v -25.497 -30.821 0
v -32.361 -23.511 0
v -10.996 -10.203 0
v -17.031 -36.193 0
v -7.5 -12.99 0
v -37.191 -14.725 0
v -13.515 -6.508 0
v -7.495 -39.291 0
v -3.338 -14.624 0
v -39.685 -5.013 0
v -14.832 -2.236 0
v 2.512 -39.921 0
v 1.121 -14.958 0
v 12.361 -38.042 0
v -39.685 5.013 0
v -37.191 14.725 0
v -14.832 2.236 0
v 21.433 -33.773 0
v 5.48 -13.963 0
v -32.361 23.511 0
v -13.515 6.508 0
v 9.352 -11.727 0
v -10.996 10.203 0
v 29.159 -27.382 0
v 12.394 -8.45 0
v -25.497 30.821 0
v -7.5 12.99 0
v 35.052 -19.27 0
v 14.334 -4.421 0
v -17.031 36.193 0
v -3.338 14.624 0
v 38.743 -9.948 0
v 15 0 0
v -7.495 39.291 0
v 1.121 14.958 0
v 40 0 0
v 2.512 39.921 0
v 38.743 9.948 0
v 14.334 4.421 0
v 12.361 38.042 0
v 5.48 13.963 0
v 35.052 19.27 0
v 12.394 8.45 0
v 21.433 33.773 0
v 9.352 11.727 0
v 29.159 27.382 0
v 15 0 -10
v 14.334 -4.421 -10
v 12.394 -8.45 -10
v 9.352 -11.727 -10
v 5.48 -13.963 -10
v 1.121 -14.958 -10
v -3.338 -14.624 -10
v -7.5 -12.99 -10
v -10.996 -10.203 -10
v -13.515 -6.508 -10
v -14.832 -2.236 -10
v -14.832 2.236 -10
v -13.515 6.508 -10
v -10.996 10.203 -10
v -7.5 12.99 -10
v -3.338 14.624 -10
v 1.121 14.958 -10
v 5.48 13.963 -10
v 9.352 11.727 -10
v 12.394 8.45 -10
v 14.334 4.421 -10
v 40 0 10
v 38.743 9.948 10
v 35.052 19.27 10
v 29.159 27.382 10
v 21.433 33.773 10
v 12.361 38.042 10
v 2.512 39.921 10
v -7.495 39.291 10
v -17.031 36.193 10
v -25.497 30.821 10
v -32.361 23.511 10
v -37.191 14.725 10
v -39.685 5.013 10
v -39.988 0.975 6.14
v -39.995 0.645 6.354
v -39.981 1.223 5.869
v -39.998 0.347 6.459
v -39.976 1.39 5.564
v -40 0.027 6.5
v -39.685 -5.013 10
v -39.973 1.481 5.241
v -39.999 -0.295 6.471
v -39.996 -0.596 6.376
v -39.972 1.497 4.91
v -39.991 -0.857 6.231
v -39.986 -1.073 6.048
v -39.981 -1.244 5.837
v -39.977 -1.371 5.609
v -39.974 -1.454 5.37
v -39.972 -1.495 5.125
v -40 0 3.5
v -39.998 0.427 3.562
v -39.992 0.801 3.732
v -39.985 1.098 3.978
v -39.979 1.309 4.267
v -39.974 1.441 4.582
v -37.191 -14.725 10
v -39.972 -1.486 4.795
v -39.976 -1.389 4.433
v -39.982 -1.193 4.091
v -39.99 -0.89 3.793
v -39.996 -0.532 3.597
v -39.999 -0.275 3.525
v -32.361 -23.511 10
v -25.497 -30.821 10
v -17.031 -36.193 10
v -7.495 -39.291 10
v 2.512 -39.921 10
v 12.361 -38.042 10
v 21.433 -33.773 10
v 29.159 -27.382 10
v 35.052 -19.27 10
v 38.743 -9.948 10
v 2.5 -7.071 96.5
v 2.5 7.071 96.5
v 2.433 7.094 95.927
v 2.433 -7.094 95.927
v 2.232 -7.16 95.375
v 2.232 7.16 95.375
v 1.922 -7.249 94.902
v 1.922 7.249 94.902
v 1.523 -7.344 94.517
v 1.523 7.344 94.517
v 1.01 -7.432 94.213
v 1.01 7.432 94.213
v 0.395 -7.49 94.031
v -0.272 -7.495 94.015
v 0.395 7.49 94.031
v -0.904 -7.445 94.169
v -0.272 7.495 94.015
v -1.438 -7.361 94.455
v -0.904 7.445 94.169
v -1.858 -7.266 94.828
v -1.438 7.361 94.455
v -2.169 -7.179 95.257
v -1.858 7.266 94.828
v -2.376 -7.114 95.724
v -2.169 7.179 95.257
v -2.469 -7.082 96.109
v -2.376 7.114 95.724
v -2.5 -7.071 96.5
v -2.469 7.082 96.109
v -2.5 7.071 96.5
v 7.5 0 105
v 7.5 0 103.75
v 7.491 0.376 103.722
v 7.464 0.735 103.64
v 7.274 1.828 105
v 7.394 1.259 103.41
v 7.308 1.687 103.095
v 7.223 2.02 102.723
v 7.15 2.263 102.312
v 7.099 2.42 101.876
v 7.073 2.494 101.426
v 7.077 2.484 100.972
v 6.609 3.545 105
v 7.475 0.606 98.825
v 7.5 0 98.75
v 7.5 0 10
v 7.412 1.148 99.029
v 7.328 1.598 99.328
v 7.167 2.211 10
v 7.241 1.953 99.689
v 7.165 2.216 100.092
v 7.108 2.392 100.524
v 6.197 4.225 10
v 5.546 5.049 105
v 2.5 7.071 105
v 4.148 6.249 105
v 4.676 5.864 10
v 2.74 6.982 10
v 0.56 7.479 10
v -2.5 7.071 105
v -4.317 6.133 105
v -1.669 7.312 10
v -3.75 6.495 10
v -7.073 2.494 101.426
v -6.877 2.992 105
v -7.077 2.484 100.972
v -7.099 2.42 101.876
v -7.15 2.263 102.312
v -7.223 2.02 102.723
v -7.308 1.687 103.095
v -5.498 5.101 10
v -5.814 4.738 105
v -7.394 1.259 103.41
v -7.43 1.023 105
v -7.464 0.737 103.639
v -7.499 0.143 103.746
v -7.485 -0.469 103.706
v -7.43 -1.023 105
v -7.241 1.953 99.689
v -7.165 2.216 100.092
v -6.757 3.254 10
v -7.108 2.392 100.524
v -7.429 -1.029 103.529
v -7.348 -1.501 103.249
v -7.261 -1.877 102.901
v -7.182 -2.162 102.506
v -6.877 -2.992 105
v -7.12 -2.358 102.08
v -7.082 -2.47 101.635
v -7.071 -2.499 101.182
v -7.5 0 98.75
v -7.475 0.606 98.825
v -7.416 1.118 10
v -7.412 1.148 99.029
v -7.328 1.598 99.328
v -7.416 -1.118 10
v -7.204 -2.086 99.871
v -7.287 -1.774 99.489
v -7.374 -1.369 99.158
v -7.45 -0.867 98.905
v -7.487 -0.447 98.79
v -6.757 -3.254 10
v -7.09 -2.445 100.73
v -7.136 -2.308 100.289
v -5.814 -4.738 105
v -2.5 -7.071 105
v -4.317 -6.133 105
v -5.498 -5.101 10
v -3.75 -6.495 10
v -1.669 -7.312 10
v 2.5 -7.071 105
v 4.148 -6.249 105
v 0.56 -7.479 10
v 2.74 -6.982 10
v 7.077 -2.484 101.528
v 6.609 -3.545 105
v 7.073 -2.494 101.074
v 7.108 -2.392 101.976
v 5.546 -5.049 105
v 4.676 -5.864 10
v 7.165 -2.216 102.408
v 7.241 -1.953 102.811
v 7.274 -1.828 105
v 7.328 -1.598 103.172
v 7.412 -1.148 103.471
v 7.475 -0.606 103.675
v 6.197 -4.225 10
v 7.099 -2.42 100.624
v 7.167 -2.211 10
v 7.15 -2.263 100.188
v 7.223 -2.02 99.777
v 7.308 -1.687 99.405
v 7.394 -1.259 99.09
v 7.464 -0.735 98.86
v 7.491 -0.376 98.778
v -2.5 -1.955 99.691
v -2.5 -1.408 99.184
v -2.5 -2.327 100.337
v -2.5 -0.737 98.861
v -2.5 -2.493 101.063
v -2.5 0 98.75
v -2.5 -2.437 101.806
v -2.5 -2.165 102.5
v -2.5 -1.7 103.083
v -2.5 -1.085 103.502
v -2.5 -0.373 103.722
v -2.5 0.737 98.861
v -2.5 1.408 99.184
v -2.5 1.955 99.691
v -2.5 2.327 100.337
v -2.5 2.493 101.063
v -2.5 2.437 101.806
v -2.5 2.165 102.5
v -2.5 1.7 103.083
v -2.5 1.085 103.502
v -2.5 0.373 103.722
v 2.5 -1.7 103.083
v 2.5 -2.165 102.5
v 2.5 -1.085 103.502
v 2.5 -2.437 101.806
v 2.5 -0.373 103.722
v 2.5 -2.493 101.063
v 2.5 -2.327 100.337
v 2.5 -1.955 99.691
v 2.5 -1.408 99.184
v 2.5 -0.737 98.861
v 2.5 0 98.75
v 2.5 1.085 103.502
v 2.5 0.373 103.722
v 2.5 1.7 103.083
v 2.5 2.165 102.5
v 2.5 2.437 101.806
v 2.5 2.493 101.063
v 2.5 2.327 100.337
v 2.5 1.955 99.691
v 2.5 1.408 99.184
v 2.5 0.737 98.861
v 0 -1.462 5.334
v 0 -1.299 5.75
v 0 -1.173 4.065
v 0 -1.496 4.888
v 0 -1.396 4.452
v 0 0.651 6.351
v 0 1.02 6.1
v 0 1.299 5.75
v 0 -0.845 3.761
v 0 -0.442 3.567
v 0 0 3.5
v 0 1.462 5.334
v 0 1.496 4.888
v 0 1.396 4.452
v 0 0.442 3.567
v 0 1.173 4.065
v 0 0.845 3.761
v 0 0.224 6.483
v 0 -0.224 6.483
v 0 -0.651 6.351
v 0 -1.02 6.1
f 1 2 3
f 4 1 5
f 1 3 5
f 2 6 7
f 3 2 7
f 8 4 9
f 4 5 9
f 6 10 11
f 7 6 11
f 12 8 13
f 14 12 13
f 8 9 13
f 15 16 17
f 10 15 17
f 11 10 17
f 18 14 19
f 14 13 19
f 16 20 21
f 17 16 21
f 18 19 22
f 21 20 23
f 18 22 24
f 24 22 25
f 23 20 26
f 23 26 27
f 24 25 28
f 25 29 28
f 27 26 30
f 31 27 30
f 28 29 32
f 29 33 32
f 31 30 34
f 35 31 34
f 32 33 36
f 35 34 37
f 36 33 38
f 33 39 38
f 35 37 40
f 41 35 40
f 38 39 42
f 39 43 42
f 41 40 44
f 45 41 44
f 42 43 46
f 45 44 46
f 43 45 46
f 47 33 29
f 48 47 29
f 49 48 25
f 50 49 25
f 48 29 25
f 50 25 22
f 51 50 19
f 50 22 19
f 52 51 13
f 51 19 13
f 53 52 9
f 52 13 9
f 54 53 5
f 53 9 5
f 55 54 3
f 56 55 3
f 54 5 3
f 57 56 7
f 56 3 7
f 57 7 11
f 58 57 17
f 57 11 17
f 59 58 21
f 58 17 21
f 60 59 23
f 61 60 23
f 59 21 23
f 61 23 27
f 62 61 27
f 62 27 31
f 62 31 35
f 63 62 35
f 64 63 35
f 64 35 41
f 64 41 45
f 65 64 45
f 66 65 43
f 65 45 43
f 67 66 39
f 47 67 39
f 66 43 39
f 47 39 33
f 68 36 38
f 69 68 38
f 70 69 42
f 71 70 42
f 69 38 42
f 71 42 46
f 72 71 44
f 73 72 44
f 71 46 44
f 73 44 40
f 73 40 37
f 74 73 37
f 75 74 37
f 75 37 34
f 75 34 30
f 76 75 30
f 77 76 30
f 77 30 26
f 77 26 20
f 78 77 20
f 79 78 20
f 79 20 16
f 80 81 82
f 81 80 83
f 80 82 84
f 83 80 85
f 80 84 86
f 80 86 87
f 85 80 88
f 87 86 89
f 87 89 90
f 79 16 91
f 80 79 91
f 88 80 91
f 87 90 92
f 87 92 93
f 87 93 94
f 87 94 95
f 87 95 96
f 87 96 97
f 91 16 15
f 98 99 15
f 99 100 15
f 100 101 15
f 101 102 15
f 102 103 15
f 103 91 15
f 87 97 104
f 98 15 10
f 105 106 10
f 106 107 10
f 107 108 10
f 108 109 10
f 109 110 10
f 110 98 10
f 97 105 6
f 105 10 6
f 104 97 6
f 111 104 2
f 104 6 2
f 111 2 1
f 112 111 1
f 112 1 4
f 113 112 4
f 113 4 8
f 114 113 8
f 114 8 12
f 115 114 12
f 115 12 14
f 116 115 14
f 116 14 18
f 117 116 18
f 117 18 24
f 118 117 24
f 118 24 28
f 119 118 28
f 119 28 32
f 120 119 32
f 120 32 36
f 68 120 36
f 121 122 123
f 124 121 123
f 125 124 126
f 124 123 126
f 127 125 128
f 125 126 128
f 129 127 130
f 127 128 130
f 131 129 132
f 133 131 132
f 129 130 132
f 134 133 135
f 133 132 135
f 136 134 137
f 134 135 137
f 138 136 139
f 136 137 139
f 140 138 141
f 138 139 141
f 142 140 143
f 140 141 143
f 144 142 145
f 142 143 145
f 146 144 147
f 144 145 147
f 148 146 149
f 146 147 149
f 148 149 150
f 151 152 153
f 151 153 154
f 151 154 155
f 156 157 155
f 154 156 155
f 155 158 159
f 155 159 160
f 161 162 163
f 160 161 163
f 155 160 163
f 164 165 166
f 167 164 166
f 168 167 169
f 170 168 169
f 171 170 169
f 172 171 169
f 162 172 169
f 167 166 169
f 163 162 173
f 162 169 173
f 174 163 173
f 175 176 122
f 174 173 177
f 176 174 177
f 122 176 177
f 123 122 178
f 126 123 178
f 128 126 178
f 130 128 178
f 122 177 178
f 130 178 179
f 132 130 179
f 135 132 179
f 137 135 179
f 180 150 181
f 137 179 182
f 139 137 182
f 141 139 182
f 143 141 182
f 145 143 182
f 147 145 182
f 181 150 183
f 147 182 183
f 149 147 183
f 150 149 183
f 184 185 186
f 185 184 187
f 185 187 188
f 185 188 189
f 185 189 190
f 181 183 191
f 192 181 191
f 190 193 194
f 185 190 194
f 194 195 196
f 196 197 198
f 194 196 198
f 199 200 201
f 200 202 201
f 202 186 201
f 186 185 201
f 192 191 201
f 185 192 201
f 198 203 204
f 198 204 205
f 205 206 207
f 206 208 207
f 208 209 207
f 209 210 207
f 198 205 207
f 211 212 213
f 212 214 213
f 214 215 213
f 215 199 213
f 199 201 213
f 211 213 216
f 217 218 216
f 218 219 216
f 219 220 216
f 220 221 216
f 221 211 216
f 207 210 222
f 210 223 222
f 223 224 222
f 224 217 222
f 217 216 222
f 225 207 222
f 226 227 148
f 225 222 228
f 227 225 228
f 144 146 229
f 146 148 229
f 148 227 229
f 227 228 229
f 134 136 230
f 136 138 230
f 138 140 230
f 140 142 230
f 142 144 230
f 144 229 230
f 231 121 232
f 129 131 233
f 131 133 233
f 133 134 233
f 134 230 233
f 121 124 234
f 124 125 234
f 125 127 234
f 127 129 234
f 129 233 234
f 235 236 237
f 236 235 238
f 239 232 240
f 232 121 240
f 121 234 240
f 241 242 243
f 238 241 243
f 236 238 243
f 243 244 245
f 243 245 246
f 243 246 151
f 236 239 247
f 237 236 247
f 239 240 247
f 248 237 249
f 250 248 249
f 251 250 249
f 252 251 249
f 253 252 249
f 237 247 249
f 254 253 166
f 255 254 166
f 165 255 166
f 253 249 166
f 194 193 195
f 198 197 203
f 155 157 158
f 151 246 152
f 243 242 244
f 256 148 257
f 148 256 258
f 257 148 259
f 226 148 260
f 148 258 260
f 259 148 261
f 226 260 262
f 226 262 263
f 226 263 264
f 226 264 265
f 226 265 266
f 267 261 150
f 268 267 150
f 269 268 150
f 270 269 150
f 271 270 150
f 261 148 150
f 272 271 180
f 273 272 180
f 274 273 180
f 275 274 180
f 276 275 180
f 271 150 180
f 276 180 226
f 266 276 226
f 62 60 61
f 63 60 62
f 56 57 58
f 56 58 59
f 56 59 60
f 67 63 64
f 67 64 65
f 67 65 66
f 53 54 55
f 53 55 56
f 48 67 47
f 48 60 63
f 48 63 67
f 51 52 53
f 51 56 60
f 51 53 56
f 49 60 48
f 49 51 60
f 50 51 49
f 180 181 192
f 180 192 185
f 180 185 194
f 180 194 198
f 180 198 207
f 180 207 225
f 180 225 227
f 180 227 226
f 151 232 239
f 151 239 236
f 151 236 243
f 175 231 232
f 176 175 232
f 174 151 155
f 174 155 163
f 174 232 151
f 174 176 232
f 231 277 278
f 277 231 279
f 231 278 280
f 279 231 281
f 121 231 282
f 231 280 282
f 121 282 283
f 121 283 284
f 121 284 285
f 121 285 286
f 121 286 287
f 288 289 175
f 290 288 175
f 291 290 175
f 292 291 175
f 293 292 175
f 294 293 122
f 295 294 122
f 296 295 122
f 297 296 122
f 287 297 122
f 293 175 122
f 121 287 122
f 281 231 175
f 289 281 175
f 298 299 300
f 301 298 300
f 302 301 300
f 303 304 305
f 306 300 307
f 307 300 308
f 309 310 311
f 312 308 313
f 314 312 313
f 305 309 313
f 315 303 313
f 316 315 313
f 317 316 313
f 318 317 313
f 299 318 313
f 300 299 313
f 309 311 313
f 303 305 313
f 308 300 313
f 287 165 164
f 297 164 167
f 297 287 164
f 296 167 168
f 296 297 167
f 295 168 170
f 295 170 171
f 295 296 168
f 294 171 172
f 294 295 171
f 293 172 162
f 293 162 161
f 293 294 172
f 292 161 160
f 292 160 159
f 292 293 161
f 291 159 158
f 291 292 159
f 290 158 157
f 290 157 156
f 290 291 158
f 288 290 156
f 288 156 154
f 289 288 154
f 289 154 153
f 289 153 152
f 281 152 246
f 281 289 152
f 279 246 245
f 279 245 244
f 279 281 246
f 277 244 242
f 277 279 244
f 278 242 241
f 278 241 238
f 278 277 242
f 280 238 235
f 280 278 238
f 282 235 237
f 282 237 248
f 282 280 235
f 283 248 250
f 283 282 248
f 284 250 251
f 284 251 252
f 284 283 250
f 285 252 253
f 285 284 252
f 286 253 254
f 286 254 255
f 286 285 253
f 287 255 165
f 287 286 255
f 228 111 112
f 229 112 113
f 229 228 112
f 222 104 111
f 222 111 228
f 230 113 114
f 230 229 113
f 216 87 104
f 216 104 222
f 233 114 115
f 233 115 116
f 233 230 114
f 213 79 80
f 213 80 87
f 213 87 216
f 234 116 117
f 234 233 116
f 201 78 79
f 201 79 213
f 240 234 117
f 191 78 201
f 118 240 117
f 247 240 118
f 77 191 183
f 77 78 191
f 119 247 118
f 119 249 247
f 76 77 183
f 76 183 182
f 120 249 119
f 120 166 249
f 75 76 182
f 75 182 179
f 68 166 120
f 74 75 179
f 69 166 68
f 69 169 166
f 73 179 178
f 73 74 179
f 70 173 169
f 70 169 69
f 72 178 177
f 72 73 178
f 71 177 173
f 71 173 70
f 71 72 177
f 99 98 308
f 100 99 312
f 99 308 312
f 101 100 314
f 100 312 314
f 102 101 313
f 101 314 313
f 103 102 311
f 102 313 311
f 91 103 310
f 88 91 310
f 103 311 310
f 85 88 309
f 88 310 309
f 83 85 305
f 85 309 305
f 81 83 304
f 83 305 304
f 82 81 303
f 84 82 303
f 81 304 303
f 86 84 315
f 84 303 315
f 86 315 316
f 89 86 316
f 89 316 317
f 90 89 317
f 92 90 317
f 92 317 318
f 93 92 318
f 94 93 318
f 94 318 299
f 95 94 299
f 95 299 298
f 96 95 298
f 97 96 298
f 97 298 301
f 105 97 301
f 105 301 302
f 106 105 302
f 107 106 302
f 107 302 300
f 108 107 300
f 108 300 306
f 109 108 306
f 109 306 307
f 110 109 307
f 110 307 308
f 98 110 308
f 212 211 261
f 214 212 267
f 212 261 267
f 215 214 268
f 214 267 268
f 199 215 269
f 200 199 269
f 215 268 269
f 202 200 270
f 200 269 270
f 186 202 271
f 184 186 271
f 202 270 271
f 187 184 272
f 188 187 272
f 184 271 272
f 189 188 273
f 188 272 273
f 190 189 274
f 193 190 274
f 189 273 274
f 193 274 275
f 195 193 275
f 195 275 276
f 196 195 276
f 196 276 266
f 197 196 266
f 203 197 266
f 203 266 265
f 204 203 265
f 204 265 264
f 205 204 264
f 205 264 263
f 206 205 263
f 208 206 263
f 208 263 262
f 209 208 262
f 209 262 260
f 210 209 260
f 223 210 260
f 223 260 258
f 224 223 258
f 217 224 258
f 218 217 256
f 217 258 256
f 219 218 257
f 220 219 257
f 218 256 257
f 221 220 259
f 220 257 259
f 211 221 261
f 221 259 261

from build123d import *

# Parameters (mm, degrees)
SKETCH1_R           = 40
BOSS_EXTRUDE1_DEPTH = 10
SKETCH12_R          = 15
BOSS_EXTRUDE3_DEPTH = 10
SKETCH13_R          = 7.5
BOSS_EXTRUDE4_DEPTH = 95
CUT_EXTRUDE1_DEPTH  = 120.268604419
SKETCH17_R          = 2.5
CUT_EXTRUDE3_DEPTH  = 120.268604507
SKETCH18_R          = 1.5
CUT_EXTRUDE4_DEPTH  = 120.268604507


with BuildPart() as part:
    # Sketch1 → Boss-Extrude1 (new body)
    with BuildSketch(Plane.XY):
        Circle(SKETCH1_R)
    extrude(amount=BOSS_EXTRUDE1_DEPTH)

    # Sketch12 → Boss-Extrude3 (add)
    with BuildSketch(Plane(origin=(0, 0, 0), x_dir=(-1, 0, 0), z_dir=(0, 0, -1))):
        with Locations(Location((0, 0, 0), (0, 0, 180))):
            Circle(SKETCH12_R)
    extrude(amount=BOSS_EXTRUDE3_DEPTH)

    # Sketch13 → Boss-Extrude4 (add)
    with BuildSketch(Plane.XY.offset(10)):
        Circle(SKETCH13_R)
    extrude(amount=BOSS_EXTRUDE4_DEPTH)

    # Sketch14 → Cut-Extrude1 (cut, through all)
    with BuildSketch(Plane(origin=(0, 0, 0), x_dir=(1, 0, 0), z_dir=(0, 1, 0))):
        with BuildLine():
            Line((-2.5, -105), (2.5, -105))
            Line((2.5, -105), (2.5, -96.5))
            ThreePointArc((2.5, -96.5), (0, -94), (-2.5, -96.5))
            Line((-2.5, -96.5), (-2.5, -105))
        make_face()
    cut_extrude1 = extrude(amount=CUT_EXTRUDE1_DEPTH, mode=Mode.SUBTRACT)

    # Mirror4: Cut-Extrude1 across plane
    add(cut_extrude1.mirror(Plane.ZX), mode=Mode.SUBTRACT)

    # Sketch17 → Cut-Extrude3 (cut, through all)
    with BuildSketch(Plane(origin=(0, 0, 0), x_dir=(0, 0, -1), z_dir=(1, 0, 0))):
        with Locations((-101.25, 0)):
            Circle(SKETCH17_R)
    cut_extrude3 = extrude(amount=-CUT_EXTRUDE3_DEPTH, mode=Mode.SUBTRACT)

    # Mirror6: Cut-Extrude3 across plane
    add(cut_extrude3.mirror(Plane(origin=(0, 0, 0), x_dir=(0, 0, 1), z_dir=(1, 0, 0))), mode=Mode.SUBTRACT)

    # Sketch18 → Cut-Extrude4 (cut, through all)
    with BuildSketch(Plane(origin=(0, 0, 0), x_dir=(0, 0, -1), z_dir=(1, 0, 0))):
        with Locations((-5, 0)):
            Circle(SKETCH18_R)
    extrude(amount=-CUT_EXTRUDE4_DEPTH, mode=Mode.SUBTRACT)


solid = part.part
